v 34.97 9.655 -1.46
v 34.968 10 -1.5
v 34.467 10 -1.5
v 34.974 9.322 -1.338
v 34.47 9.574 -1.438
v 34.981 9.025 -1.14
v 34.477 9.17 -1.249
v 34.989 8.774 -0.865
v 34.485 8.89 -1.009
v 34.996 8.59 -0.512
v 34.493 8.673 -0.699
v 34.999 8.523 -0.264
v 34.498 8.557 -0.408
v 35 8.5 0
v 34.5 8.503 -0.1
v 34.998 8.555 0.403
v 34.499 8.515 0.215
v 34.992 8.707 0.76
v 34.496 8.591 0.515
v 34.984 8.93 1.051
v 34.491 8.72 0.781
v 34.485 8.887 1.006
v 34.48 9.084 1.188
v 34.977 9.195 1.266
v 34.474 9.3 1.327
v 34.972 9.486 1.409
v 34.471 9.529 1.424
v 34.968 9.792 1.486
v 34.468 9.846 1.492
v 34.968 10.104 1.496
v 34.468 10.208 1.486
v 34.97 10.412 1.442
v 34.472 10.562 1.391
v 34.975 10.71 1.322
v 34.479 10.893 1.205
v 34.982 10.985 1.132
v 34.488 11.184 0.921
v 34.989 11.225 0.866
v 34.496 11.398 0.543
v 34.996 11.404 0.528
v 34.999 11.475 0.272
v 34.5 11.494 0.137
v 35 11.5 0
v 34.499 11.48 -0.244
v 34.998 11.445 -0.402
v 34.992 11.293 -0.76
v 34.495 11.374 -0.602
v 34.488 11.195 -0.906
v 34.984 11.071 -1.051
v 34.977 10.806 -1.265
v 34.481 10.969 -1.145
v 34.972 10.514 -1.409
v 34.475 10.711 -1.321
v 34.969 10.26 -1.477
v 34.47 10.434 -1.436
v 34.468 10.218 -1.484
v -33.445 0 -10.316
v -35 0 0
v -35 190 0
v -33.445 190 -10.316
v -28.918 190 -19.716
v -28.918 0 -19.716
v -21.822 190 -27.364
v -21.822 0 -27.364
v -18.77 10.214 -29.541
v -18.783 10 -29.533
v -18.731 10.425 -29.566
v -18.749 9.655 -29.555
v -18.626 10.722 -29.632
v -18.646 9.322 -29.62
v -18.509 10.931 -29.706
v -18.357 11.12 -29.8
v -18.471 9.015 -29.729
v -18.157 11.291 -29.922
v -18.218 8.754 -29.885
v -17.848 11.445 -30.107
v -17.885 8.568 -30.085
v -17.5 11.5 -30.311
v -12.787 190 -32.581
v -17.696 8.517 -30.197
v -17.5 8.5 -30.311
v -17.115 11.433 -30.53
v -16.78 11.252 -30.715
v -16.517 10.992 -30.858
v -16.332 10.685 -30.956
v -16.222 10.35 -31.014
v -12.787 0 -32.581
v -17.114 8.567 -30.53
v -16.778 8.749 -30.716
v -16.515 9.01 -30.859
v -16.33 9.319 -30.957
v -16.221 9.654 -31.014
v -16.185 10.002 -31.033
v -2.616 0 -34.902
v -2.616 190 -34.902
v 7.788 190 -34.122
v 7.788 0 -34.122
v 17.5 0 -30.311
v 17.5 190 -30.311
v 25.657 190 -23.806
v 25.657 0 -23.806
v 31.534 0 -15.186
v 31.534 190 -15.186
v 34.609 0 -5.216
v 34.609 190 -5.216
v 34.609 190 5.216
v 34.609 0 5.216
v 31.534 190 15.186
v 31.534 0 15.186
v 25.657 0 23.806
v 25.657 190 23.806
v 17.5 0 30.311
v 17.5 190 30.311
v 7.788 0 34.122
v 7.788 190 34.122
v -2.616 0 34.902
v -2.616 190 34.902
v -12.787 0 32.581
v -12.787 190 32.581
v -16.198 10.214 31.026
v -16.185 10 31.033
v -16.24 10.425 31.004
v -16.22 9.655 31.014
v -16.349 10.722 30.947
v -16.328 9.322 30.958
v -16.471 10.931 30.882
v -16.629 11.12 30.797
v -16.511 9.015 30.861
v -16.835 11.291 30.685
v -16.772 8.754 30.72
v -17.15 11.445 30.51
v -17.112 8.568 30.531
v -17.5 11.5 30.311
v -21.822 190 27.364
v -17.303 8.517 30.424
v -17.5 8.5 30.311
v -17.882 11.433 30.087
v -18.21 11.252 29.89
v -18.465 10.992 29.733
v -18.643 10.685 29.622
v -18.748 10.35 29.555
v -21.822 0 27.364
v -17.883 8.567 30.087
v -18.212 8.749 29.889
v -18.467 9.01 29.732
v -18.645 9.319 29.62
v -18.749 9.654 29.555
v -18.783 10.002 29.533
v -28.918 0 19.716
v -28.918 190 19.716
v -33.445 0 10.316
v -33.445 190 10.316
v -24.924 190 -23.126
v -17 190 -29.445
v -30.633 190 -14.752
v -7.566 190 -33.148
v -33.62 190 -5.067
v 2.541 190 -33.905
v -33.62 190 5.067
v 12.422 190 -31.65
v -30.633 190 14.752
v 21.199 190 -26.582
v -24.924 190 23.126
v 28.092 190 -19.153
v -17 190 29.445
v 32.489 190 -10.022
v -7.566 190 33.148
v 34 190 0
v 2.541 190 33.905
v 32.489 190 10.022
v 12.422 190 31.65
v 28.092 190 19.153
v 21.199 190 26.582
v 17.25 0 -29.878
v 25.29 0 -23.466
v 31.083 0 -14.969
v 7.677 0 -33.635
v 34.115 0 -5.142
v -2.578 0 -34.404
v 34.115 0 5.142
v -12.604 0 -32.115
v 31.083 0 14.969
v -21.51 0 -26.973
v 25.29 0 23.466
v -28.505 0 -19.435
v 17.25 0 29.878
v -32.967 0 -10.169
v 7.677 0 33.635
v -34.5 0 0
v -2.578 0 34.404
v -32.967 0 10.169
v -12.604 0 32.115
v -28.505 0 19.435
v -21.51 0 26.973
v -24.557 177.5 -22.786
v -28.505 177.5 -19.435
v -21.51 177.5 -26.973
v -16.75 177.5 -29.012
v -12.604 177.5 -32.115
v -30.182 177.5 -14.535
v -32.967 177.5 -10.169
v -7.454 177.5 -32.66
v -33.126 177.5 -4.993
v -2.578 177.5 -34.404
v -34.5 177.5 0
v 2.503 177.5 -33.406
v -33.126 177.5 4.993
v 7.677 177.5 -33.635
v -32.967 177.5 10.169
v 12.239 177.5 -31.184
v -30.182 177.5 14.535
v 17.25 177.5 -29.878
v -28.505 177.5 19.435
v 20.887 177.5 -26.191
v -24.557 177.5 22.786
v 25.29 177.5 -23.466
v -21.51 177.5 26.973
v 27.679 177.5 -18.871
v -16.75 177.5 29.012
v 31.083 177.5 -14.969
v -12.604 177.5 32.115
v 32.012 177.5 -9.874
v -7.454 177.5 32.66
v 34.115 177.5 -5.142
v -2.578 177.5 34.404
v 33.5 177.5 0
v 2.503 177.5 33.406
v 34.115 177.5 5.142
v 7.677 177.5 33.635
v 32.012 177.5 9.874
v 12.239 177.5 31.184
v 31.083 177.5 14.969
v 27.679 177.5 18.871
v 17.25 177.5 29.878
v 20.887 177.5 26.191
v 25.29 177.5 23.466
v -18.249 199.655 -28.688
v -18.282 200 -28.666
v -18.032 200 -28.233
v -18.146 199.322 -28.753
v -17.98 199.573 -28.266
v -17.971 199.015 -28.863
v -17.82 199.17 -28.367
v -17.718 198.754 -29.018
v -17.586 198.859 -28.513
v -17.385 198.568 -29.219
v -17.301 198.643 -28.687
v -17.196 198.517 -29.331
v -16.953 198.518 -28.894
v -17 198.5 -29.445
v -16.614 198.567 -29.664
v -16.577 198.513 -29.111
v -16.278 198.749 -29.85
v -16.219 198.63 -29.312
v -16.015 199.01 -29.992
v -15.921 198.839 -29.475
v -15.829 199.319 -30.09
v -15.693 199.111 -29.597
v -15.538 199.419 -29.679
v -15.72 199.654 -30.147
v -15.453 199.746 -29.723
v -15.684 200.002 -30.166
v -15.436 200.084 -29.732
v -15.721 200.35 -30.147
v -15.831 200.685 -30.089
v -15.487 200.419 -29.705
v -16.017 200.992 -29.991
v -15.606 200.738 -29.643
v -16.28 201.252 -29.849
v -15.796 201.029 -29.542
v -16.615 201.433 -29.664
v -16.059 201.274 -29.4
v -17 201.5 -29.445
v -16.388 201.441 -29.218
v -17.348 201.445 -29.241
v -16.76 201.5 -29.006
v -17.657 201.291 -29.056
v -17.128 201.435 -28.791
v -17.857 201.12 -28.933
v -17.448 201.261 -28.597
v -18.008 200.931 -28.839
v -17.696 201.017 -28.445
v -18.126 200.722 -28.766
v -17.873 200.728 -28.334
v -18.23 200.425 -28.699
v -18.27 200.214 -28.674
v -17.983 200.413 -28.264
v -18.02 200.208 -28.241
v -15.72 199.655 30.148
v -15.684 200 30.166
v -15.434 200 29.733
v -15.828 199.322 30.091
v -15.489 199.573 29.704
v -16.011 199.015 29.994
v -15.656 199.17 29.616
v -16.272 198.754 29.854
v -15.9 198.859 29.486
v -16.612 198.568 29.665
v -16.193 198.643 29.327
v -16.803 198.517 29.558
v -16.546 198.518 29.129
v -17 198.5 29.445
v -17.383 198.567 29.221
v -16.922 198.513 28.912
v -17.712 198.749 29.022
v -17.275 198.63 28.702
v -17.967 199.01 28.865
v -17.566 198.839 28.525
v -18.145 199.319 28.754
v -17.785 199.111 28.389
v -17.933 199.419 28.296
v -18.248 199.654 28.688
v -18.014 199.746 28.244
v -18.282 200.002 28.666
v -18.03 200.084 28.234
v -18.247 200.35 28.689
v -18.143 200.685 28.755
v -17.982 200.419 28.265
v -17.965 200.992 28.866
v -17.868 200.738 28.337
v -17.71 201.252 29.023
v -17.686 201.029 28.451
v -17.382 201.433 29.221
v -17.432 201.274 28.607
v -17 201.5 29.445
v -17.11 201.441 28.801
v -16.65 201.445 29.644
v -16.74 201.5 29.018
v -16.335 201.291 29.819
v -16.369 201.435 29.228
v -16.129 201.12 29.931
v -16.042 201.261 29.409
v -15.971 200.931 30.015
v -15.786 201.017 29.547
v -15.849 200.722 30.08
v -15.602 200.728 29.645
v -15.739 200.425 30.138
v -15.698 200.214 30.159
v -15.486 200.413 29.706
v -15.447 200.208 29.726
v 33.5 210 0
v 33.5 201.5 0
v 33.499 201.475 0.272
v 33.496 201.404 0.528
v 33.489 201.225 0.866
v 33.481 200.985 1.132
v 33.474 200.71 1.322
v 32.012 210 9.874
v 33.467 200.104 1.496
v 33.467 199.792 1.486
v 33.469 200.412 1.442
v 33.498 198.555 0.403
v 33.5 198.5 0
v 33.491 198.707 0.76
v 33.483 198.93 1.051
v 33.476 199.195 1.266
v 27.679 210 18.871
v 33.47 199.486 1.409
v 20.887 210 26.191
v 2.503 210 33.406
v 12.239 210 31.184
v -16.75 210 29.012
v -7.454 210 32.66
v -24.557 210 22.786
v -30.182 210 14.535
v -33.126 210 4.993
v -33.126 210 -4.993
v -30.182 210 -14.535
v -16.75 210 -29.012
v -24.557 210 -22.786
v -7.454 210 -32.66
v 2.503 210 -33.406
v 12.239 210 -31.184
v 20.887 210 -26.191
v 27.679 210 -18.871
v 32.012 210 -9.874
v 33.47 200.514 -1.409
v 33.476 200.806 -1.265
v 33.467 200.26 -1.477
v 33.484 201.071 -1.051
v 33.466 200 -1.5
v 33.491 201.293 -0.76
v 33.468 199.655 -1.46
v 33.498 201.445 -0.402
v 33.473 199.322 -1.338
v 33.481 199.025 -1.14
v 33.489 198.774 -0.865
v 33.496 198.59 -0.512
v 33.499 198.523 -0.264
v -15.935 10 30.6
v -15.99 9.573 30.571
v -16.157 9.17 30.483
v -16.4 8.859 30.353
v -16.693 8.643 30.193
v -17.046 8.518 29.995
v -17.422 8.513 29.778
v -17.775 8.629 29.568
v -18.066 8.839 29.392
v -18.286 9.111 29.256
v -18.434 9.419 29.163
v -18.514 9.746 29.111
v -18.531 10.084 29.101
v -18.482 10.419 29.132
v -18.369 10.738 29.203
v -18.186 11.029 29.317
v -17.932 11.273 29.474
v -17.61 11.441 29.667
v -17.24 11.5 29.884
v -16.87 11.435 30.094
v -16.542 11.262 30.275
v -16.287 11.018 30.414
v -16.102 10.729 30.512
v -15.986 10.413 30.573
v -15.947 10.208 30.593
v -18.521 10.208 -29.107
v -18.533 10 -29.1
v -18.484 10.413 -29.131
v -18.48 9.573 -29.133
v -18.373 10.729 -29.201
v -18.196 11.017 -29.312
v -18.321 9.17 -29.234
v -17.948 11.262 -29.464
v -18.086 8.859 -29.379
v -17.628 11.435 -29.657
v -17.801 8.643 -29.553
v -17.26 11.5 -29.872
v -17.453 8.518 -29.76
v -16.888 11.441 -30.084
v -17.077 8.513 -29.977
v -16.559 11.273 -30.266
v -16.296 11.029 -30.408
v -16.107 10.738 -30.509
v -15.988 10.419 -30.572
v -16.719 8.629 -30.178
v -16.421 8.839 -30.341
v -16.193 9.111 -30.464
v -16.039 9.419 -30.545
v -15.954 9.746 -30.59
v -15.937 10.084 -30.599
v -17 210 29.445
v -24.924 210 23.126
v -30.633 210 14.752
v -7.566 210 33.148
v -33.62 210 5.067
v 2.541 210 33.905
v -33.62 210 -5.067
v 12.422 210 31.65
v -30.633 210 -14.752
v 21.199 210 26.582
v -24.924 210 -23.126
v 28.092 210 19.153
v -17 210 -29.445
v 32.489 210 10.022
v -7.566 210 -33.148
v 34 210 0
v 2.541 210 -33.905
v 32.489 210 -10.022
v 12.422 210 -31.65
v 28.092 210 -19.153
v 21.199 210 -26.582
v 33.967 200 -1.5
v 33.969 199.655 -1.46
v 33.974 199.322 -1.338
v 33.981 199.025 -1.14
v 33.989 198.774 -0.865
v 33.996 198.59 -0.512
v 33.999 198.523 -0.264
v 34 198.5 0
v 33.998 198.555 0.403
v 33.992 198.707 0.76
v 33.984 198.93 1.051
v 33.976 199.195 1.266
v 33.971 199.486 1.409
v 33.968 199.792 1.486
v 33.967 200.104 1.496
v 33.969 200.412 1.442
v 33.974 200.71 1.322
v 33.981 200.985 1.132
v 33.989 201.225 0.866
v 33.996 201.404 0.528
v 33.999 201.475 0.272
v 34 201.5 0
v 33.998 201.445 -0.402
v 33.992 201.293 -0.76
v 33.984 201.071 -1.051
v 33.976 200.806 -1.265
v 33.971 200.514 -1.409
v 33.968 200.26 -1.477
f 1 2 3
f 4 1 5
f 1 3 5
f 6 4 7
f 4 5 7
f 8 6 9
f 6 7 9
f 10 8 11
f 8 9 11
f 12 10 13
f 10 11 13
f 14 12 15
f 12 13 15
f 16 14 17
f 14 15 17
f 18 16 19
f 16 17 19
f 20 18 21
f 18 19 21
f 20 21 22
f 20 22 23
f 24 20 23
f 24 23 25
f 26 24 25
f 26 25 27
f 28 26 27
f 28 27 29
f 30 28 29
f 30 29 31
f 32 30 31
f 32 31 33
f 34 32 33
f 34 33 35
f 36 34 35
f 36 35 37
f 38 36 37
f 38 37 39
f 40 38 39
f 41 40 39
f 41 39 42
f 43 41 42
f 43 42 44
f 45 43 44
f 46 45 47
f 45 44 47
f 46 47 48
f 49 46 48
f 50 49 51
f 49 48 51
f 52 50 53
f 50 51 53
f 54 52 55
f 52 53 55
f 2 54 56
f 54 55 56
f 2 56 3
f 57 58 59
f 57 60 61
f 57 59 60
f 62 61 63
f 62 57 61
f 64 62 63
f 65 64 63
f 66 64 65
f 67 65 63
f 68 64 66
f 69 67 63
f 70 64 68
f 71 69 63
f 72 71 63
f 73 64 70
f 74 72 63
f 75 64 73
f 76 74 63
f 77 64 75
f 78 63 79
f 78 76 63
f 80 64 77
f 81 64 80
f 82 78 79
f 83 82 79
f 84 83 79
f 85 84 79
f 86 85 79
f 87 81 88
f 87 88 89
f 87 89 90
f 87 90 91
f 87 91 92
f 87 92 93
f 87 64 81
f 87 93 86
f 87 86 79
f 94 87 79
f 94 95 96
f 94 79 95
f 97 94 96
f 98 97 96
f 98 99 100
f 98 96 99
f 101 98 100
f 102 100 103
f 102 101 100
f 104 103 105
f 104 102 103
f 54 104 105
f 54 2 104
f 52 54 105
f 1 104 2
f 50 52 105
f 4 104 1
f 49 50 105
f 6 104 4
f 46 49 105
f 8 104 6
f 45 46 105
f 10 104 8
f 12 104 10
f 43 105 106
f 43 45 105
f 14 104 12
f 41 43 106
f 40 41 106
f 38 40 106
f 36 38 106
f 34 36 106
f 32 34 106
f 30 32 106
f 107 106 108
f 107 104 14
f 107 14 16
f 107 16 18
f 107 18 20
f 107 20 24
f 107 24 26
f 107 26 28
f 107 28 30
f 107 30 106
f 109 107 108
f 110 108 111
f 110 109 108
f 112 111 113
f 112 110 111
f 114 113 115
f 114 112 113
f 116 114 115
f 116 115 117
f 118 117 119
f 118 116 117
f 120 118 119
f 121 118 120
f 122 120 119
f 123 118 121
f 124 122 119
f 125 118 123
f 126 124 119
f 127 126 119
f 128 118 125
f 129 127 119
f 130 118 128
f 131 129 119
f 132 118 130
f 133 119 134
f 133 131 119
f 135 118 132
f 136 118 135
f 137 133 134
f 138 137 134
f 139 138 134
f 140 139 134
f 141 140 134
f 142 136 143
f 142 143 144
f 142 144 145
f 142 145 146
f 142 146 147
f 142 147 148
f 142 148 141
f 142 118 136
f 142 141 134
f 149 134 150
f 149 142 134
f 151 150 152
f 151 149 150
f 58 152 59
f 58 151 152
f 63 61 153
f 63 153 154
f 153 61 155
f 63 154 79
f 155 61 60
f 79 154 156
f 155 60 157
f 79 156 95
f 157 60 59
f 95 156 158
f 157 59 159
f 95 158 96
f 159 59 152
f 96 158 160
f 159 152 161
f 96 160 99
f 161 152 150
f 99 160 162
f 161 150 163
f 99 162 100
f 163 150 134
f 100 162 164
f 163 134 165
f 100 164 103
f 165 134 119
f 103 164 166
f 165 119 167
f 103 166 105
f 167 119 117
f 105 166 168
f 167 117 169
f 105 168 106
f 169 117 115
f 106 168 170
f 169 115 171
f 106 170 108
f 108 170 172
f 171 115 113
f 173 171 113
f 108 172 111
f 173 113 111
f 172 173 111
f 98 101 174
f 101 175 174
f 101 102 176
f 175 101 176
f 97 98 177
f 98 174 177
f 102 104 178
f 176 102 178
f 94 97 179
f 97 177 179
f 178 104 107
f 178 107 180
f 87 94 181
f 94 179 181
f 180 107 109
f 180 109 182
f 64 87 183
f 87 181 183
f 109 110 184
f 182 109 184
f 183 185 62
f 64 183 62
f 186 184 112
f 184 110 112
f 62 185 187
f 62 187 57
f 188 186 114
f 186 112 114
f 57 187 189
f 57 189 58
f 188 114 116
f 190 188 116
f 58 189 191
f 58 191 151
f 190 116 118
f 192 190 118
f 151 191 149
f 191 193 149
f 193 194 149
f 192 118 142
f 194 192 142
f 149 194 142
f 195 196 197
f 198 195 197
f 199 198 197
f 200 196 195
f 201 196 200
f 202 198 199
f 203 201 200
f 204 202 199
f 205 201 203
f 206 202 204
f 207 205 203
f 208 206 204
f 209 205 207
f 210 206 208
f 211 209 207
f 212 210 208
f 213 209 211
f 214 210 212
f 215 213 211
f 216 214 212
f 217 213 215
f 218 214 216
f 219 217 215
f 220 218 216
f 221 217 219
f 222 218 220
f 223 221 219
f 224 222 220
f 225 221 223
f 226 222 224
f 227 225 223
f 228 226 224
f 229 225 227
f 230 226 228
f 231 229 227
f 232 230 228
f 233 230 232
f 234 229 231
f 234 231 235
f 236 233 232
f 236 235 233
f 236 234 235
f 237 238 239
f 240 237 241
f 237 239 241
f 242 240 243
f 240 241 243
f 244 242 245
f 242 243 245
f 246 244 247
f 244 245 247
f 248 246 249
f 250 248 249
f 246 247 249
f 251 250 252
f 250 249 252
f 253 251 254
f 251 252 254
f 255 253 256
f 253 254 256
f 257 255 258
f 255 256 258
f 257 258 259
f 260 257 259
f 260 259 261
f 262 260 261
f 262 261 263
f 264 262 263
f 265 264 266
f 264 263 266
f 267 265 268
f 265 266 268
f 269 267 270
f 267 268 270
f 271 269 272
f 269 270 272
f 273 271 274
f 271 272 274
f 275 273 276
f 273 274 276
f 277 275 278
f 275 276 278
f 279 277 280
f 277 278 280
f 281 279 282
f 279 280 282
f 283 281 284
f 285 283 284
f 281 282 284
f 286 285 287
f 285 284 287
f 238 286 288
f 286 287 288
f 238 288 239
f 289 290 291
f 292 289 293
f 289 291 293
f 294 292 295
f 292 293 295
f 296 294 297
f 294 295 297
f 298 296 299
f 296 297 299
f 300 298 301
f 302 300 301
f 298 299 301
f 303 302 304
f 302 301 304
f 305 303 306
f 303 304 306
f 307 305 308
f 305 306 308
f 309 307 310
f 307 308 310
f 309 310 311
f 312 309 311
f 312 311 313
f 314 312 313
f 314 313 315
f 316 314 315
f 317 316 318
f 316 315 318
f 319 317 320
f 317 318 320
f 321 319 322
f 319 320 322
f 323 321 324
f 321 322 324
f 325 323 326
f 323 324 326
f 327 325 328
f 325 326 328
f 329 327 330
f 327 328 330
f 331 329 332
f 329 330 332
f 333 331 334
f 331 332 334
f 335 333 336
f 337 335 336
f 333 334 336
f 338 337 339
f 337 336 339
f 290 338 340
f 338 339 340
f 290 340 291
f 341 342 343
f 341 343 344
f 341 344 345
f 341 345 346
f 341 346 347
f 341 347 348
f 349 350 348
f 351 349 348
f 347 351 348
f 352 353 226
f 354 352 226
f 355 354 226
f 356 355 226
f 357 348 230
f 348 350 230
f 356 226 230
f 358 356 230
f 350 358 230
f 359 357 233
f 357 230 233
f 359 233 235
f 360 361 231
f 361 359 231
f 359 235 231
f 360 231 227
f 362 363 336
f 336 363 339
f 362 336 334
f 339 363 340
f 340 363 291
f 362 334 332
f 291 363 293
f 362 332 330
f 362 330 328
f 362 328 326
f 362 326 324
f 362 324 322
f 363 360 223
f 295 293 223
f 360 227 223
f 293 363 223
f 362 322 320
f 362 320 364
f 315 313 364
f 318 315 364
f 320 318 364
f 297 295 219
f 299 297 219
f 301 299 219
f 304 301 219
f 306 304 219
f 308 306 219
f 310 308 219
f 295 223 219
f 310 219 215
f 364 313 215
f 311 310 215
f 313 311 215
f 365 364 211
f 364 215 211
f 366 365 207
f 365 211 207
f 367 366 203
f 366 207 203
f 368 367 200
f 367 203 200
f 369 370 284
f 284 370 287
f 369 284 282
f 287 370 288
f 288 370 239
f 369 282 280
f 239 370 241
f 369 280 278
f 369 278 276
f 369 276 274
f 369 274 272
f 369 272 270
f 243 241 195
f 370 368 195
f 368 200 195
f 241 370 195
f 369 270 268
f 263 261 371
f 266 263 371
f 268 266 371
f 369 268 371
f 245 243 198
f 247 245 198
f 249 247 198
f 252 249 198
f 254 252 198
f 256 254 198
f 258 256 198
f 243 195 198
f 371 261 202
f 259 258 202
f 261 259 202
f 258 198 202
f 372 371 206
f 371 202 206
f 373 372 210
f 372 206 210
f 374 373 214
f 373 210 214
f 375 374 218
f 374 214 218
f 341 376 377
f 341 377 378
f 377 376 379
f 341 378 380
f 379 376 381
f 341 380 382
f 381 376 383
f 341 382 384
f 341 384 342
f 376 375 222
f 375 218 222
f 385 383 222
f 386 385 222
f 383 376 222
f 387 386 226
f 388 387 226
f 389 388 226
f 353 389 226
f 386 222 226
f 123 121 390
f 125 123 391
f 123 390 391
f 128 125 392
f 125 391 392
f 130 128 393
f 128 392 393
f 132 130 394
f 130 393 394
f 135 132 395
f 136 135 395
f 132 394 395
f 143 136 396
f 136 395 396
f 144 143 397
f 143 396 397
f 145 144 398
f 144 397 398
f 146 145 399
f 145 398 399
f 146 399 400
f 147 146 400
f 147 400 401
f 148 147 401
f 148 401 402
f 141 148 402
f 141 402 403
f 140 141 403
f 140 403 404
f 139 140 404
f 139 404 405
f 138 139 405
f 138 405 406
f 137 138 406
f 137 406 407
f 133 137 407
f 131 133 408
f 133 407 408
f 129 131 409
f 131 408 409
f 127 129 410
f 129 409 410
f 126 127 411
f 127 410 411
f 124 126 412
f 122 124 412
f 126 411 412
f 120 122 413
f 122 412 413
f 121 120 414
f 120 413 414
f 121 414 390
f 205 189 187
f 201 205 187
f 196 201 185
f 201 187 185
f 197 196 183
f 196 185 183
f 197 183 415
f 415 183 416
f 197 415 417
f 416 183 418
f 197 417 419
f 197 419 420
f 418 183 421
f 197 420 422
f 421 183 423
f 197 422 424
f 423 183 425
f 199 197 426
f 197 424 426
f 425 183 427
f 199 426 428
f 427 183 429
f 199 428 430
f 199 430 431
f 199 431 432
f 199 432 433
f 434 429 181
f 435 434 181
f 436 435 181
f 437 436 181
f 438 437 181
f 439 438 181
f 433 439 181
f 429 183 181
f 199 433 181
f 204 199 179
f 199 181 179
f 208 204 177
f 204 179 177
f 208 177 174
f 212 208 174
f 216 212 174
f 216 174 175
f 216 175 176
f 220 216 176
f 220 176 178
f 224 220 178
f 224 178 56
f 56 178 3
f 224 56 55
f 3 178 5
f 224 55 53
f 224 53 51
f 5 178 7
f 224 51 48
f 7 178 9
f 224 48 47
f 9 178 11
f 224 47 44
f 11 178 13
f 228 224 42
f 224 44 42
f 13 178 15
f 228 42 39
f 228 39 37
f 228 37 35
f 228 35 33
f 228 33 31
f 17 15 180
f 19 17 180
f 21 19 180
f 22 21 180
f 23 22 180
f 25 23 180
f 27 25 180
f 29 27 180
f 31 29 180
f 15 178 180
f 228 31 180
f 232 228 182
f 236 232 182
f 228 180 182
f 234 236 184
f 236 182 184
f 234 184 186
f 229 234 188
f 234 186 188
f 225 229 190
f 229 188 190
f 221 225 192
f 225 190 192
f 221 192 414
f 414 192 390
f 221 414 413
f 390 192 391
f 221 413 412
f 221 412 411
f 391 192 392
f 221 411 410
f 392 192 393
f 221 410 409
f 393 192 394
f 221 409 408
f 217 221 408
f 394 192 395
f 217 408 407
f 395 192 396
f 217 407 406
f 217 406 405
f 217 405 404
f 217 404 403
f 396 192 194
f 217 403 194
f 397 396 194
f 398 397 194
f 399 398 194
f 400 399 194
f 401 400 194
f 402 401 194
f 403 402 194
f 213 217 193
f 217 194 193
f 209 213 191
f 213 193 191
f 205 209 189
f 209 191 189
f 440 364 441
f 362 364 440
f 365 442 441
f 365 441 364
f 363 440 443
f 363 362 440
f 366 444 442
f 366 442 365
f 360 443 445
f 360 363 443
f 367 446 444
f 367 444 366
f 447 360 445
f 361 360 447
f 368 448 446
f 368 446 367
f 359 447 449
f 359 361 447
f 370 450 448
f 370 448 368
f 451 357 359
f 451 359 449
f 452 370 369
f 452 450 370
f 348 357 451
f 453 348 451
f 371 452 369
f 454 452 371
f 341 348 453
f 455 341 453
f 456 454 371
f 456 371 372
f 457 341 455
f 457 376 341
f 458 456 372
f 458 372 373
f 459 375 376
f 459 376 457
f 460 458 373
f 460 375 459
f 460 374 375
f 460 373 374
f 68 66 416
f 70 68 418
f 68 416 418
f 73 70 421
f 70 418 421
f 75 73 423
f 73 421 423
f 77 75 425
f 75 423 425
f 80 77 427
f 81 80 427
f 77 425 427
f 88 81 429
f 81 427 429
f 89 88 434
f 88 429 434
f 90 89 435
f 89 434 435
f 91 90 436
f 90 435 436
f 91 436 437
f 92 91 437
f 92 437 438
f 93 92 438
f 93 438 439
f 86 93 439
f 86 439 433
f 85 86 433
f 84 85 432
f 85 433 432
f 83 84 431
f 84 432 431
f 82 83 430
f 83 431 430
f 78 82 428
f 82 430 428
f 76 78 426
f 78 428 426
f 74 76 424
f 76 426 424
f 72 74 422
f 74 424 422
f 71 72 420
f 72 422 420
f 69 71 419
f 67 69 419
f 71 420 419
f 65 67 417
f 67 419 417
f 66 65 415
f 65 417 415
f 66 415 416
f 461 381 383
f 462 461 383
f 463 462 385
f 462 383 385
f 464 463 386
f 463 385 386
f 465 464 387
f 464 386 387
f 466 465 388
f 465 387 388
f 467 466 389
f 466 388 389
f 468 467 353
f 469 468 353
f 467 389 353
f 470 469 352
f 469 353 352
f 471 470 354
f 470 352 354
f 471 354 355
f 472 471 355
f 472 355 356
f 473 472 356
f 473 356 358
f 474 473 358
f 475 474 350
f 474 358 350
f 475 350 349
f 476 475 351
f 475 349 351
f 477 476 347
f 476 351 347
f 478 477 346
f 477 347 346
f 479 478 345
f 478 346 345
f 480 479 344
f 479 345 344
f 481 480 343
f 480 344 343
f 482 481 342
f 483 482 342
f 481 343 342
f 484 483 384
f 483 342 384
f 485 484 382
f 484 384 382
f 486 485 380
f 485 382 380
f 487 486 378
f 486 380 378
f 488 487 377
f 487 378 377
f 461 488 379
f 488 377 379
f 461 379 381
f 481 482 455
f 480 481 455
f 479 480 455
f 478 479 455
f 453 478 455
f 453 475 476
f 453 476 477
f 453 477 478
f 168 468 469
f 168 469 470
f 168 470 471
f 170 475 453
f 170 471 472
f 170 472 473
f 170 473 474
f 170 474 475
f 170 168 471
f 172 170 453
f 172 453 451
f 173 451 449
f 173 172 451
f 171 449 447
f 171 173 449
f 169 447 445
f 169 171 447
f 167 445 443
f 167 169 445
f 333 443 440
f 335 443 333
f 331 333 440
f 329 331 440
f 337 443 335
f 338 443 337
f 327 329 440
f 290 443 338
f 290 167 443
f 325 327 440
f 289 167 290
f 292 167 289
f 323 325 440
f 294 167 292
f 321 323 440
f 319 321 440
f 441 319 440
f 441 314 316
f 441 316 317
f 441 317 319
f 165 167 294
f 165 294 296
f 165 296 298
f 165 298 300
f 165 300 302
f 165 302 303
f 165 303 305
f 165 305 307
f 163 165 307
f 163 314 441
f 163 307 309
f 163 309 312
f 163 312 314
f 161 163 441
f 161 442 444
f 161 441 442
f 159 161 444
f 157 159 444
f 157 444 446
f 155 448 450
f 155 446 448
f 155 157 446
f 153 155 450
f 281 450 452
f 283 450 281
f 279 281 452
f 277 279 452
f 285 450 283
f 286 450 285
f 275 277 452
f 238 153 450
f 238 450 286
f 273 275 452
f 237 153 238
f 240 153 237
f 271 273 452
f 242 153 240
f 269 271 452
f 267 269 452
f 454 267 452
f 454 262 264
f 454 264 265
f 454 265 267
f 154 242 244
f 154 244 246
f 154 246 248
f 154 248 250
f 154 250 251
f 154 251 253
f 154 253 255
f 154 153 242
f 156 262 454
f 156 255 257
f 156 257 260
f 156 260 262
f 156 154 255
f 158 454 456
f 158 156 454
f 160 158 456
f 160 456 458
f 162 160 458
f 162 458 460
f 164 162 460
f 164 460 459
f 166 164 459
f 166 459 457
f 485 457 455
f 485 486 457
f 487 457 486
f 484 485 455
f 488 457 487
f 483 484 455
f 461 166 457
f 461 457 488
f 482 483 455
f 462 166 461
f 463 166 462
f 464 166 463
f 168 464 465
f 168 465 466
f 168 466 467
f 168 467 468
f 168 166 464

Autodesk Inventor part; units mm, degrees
ref_plane "XZ Plane" through (0, 0, 0) normal (0, 1, 0) x (-1, 0, 0)
sketch "Sketch1" plane through (0, 0, 0) normal (0, 1, 0) x (-1, 0, 0)
  circle A0 centre (0, 0) radius 35
  circle A1 centre (0, 0) radius 34.5
  dimension "d0" = 70
  dimension "d1" = 69
extrude "Extrusion1" add sketch "Sketch1" along normal blind 190
ref_plane "Work Plane2" through (35, 0, 0) normal (1, 0, 0) x (0, 1, 0)
sketch "Sketch4" plane through (35, 0, 0) normal (1, 0, 0) x (0, 1, 0)
  line L0 (190, -35) -> (190, 35) projected
  point P0 (0, 0)
  point P1 (10, 0)
  dimension "d48" = 10
hole "Hole2" at (35, 10, 0) direction (-1, 0, 0) diameter 3 depth 8 tip angle 118
sketch "Sketch5" plane through (0, 190, 0) normal (0, 1, 0) x (1, 0, 0)
  circle A0 centre (0, 0) radius 34
  circle A1 centre (0, 0) radius 33.5
  dimension "d44" = 68
  dimension "d45" = 67
extrude "Extrusion3" add sketch "Sketch5" along normal blind 20
sketch "Sketch6" plane through (0, 190, 0) normal (0, -1, 0) x (1, 0, 0)
  circle A0 centre (0, 0) radius 33.5
  circle A1 centre (0, 0) radius 34.5 projected
  circle A2 centre (0, 0) radius 35
extrude "Extrusion4" add sketch "Sketch6" along normal blind 12.5 contours A1
ref_plane "Work Plane4" through (34, 0, 0) normal (1, 0, 0) x (0, 1, 0)
sketch "Sketch8" plane through (34, 0, 0) normal (1, 0, 0) x (0, 1, 0)
  line L0 (210, -34) -> (210, 34) projected
  point P0 (0, 0)
  point P1 (200, 0)
  dimension "d61" = 10
hole "Hole4" at (34, 200, 0) direction (-1, 0, 0) diameter 3 depth 8 tip angle 118
pattern_circular "Circular Pattern2" count 3 over 360 about axis through (0, 0, 0) along (0, 1, 0) of "Hole2", "Hole4"
properties part number "Lower skin" material "Plastic, Opaque White"
